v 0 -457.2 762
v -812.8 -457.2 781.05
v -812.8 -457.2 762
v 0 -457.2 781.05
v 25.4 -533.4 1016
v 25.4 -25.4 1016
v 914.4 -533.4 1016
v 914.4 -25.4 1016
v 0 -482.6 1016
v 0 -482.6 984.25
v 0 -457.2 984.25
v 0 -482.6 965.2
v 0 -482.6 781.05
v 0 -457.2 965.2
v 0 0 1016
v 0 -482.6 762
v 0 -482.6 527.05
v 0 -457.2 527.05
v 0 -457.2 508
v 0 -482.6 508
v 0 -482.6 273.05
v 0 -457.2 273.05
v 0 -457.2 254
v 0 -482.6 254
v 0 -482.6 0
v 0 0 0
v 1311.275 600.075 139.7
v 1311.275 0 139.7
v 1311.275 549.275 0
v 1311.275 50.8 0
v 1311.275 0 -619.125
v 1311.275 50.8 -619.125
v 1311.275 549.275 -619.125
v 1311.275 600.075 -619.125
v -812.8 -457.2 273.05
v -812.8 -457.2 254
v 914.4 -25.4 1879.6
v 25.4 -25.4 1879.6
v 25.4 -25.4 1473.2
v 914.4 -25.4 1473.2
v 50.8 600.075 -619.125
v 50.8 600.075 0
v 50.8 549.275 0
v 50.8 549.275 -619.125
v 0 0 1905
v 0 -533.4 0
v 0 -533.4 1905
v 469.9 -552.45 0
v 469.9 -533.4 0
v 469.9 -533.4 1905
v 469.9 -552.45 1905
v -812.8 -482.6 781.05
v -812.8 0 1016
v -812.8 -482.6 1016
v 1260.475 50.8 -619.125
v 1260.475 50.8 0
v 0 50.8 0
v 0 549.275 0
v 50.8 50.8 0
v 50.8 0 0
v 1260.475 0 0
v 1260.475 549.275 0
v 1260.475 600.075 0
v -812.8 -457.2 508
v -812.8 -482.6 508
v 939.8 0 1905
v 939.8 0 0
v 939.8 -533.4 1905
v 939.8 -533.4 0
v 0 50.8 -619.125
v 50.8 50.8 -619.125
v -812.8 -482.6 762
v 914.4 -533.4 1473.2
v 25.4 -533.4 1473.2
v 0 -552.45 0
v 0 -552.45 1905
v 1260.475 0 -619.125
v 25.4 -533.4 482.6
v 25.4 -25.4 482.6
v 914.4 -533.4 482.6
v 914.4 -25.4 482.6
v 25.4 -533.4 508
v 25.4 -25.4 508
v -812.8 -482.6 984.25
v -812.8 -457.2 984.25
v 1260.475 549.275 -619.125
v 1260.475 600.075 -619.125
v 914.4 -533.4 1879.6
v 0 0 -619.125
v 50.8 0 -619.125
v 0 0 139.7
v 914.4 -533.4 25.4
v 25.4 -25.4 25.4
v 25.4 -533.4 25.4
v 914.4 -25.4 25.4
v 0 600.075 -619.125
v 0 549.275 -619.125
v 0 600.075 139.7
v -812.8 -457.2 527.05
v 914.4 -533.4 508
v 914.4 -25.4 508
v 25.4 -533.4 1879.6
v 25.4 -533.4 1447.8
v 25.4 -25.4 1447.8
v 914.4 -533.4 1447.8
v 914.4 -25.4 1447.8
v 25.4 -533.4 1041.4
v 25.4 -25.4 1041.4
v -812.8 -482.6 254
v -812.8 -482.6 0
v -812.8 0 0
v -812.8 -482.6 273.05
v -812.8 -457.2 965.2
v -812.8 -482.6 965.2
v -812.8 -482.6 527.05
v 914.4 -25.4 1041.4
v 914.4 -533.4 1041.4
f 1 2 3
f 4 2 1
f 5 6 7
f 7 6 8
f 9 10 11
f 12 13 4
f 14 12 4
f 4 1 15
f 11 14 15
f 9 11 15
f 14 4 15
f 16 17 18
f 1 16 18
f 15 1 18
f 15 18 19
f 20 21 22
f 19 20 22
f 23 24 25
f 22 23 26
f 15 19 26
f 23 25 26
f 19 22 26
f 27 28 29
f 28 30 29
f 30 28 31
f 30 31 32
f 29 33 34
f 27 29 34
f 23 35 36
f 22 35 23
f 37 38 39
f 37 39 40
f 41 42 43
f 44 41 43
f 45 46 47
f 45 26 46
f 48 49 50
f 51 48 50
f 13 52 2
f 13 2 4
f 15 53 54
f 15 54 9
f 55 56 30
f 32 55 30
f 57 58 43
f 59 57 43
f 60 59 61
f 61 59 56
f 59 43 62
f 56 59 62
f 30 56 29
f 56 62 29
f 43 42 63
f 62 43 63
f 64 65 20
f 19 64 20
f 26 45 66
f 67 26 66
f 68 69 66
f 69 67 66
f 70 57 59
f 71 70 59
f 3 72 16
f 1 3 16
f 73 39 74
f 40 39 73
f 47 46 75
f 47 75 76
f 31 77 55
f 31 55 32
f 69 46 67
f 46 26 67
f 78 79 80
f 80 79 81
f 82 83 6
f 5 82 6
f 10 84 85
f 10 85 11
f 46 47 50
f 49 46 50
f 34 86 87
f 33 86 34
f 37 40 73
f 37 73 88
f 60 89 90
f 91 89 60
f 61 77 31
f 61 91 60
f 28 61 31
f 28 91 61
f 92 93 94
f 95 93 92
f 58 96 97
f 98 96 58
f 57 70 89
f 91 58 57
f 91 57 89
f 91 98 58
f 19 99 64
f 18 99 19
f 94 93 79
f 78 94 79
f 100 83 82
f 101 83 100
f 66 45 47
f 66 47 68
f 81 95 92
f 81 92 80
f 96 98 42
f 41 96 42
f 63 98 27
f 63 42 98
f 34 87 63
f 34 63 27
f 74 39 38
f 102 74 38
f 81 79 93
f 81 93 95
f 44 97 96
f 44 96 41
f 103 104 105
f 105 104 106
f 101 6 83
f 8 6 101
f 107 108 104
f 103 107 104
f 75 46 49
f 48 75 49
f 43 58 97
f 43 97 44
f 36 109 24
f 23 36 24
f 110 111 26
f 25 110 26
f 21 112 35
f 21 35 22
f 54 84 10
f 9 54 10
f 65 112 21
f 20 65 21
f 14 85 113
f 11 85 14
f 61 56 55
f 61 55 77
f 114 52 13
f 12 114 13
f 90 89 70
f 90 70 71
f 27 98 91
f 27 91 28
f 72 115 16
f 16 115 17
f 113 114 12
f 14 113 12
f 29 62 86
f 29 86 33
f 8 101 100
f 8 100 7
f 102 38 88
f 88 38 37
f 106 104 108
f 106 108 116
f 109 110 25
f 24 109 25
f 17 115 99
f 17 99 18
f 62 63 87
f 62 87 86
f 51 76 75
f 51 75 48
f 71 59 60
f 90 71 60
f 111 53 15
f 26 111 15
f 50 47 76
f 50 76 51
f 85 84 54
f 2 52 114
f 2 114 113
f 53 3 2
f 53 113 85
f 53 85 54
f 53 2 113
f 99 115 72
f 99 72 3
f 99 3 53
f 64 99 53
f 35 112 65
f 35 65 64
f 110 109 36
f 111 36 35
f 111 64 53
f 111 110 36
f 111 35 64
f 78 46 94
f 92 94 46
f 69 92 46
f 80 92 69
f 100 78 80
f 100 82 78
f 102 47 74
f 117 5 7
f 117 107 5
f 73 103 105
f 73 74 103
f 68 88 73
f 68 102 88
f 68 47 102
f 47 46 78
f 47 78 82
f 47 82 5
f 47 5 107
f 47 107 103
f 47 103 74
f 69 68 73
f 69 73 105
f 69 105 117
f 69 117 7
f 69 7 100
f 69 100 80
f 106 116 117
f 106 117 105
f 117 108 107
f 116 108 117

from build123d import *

# Parameters (mm, degrees)
F0_W      = 939.8
F0_H      = 1905
F1_DEPTH  = 25.4
F2_W      = 939.8
F2_H      = 1905
F2_W_2    = 889
F2_H_2    = 1854.2
F3_DEPTH  = 508
F4_W      = 469.9
F4_H      = 1905
F5_DEPTH  = 19.05
F6_W      = 1311.275
F6_H      = 600.075
F7_DEPTH  = 139.7
F8_W      = 50.8
F8_H      = 50.8
F9_DEPTH  = 619.125
F10_W     = 889
F10_H     = 25.4
F11_DEPTH = 508
F12_W     = 812.8
F12_H     = 482.6
F13_DEPTH = 1016
F14_W     = 812.8
F14_H     = 19.05
F15_DEPTH = 25.4


with BuildPart() as f1:
    # F0 (on Front) → F1 (new body)
    with BuildSketch(Plane.XZ):
        with Locations((469.9, 952.5)):
            Rectangle(F0_W, F0_H)
    extrude(amount=F1_DEPTH)

    # F2 (on face) → F3 (join)
    with BuildSketch(Plane.XZ.offset(25.4)):
        with Locations((469.9, 952.5)):
            Rectangle(F2_W, F2_H)
        with Locations((469.9, 952.5)):
            Rectangle(F2_W_2, F2_H_2, mode=Mode.SUBTRACT)
    extrude(amount=F3_DEPTH)

    # F10 (on face) → F11 (join, through all)
    with BuildSketch(Plane.XZ.offset(25.4)):
        with Locations((469.9, 495.3)):
            Rectangle(F10_W, F10_H)
        with Locations((469.9, 1028.7)):
            Rectangle(F10_W, F10_H)
        with Locations((469.9, 1460.5)):
            Rectangle(F10_W, F10_H)
    extrude(amount=F11_DEPTH)


with BuildPart() as f5:
    # F4 (on face) → F5 (new body)
    with BuildSketch(Plane.XZ.offset(533.4)):
        with Locations((234.95, 952.5)):
            Rectangle(F4_W, F4_H)
    extrude(amount=F5_DEPTH)


with BuildPart() as f7:
    # F6 (on Top) → F7 (new body)
    with BuildSketch(Plane.XY):
        with Locations((655.6375, 300.0375)):
            Rectangle(F6_W, F6_H)
    extrude(amount=F7_DEPTH)

    # F8 (on face) → F9 (join)
    with BuildSketch(Plane(origin=(0, 0, 0), x_dir=(1, 0, 0), z_dir=(0, 0, -1))):
        with Locations((25.4, -25.4)):
            Rectangle(F8_W, F8_H)
        with Locations((25.4, -574.675)):
            Rectangle(F8_W, F8_H)
        with Locations((1285.875, -574.675)):
            Rectangle(F8_W, F8_H)
        with Locations((1285.875, -25.4)):
            Rectangle(F8_W, F8_H)
    extrude(amount=F9_DEPTH)


with BuildPart() as f13:
    # F12 (on Top) → F13 (new body)
    with BuildSketch(Plane.XY):
        with Locations((-406.4, -241.3)):
            Rectangle(F12_W, F12_H)
    extrude(amount=F13_DEPTH)

    # F14 (on face) → F15 (cut)
    with BuildSketch(Plane.XZ.offset(482.6)):
        with Locations((-406.4, 974.725)):
            Rectangle(F14_W, F14_H)
        with Locations((-406.4, 771.525)):
            Rectangle(F14_W, F14_H)
        with Locations((-406.4, 517.525)):
            Rectangle(F14_W, F14_H)
        with Locations((-406.4, 263.525)):
            Rectangle(F14_W, F14_H)
    extrude(amount=-F15_DEPTH, mode=Mode.SUBTRACT)


solid = Compound([f1.part, f5.part, f7.part, f13.part])
